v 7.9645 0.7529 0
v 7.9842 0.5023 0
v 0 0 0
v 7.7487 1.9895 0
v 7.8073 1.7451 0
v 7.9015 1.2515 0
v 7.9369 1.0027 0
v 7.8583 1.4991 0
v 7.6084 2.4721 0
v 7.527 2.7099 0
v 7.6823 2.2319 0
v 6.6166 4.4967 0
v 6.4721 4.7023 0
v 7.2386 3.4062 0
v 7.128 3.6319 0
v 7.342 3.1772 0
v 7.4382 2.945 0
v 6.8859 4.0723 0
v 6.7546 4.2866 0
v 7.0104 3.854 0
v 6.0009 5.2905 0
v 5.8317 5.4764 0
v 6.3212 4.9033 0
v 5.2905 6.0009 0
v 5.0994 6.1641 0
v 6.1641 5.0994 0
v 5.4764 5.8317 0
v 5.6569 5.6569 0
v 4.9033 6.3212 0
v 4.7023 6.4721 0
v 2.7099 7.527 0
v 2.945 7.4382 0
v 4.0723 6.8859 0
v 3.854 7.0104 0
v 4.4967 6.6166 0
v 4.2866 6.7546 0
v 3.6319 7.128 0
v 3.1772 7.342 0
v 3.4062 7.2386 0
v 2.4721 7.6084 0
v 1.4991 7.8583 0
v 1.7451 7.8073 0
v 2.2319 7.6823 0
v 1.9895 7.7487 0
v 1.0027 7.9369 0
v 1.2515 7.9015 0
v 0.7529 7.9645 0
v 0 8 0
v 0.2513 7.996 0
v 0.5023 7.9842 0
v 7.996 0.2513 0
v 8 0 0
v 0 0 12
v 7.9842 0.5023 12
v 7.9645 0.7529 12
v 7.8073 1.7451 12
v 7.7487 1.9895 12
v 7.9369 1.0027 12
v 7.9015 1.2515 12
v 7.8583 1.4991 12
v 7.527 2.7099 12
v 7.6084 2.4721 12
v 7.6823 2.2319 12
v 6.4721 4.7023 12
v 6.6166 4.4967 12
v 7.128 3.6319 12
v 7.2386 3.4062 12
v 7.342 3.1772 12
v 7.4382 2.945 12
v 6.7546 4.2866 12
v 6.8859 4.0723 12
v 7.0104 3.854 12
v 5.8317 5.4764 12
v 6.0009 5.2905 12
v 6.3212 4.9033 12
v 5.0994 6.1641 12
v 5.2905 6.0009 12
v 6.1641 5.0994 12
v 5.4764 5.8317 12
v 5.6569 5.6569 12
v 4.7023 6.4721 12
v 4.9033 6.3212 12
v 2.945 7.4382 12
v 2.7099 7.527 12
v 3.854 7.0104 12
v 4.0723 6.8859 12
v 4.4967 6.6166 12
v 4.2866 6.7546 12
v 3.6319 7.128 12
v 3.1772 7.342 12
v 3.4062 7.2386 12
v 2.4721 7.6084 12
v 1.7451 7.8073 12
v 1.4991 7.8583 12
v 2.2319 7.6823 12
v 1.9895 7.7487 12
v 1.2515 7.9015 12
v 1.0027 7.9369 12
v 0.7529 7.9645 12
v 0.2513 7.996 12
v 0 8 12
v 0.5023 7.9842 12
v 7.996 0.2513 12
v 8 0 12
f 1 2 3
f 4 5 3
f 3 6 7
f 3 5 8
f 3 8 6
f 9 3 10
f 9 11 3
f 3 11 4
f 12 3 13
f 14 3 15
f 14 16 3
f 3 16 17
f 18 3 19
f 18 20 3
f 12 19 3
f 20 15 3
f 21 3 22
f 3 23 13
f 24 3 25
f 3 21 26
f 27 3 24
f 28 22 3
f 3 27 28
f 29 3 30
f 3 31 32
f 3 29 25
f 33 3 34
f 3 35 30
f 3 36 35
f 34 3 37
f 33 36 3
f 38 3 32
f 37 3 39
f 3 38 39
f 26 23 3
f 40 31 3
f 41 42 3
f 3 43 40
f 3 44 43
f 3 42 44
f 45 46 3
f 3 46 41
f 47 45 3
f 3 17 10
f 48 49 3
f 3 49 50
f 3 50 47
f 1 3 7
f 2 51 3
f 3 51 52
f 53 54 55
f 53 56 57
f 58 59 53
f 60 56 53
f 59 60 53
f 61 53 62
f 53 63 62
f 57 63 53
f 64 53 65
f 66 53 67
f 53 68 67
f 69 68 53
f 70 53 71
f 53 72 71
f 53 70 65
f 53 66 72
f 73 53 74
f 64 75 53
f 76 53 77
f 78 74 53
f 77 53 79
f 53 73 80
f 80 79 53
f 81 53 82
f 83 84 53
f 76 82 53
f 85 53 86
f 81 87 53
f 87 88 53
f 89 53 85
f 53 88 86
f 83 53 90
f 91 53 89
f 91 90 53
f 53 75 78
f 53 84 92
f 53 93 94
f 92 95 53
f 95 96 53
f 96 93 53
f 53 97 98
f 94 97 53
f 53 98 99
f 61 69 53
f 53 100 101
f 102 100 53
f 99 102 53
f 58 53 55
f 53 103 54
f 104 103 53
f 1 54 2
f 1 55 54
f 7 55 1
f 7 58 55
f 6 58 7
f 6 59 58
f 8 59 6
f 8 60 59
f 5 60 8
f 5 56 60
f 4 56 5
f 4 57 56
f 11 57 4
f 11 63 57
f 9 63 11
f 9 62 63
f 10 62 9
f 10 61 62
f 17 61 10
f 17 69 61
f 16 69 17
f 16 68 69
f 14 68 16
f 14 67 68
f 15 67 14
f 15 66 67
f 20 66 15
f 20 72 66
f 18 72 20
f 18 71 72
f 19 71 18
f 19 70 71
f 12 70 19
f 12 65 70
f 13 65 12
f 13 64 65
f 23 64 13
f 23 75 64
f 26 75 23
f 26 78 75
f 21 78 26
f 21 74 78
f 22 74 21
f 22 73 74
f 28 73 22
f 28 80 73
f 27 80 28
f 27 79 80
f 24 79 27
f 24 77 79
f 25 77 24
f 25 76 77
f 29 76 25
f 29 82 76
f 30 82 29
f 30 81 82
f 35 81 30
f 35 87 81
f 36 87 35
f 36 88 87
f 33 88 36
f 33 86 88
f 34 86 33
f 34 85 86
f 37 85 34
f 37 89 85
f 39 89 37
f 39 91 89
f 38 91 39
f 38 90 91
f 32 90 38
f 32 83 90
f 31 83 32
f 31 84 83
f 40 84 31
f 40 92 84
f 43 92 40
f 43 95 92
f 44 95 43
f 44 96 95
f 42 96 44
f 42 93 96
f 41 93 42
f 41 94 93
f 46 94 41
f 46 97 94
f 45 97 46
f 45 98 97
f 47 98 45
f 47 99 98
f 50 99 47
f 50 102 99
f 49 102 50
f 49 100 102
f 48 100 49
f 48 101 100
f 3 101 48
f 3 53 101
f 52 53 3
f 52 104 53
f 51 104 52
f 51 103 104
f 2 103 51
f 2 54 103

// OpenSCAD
/*
Plot a 2D or 3D arc from 0.1 to ~358 degrees.

Set Width of drawn arc, Radius, Thickness, resolution ($fn) and height for the 3D arc. Arc is centered around the origin

By tony@think3dprint3d.com
GPLv3

*/


rotate([0,0,-45])
3D_arc(w=8,r=4,deg=90,h=12,fn=200);


module 2D_arc(w, r, deg=90,fn = 100 ) {
	render() {
		difference() {
			// outer circle
			circle(r=r+w/2,center=true,$fn=fn);
			// outer circle
			circle(r=r-w/2,center=true,$fn=fn);

		//remove the areas not covered by the arc
		translate([sin(90-deg/2)*((r+w/2)*2),
						-sin(deg/2)*((r+w/2)*2)])
			rotate([0,0,90-deg/2])
				translate([((r+w/2))-sin(90-(deg)/4)*((r+w/2)),
							((r+w/2))*2-sin(90-(deg)/4)*((r+w/2))])
					square([sin(90-deg/4)*((r+w/2)*2),
								sin(90-deg/4)*((r+w/2)*2)],center=true);
		translate([-sin(90-(deg)/2)*((r+w/2)*2),
						-sin(deg/2)*((r+w/2)*2)])
			rotate([0,0,-(90-deg/2)])
			  translate([-((r+w/2))+sin(90-(deg)/4)*((r+w/2)),
							((r+w/2))*2-sin(90-(deg)/4)*((r+w/2))])
					square([sin(90-deg/4)*((r+w/2)*2),
								sin(90-deg/4)*((r+w/2)*2)],center=true);
		}
		//line to see the arc
		//#translate([-((r)*2)/2, sin((180-deg)/2)*(r)]) square([(r+w/2)*2+1,0.01]); 
	}
}

module 3D_arc(w, r, deg, h,fn) {
	linear_extrude(h)
			2D_arc(w, r, deg,fn);

}
